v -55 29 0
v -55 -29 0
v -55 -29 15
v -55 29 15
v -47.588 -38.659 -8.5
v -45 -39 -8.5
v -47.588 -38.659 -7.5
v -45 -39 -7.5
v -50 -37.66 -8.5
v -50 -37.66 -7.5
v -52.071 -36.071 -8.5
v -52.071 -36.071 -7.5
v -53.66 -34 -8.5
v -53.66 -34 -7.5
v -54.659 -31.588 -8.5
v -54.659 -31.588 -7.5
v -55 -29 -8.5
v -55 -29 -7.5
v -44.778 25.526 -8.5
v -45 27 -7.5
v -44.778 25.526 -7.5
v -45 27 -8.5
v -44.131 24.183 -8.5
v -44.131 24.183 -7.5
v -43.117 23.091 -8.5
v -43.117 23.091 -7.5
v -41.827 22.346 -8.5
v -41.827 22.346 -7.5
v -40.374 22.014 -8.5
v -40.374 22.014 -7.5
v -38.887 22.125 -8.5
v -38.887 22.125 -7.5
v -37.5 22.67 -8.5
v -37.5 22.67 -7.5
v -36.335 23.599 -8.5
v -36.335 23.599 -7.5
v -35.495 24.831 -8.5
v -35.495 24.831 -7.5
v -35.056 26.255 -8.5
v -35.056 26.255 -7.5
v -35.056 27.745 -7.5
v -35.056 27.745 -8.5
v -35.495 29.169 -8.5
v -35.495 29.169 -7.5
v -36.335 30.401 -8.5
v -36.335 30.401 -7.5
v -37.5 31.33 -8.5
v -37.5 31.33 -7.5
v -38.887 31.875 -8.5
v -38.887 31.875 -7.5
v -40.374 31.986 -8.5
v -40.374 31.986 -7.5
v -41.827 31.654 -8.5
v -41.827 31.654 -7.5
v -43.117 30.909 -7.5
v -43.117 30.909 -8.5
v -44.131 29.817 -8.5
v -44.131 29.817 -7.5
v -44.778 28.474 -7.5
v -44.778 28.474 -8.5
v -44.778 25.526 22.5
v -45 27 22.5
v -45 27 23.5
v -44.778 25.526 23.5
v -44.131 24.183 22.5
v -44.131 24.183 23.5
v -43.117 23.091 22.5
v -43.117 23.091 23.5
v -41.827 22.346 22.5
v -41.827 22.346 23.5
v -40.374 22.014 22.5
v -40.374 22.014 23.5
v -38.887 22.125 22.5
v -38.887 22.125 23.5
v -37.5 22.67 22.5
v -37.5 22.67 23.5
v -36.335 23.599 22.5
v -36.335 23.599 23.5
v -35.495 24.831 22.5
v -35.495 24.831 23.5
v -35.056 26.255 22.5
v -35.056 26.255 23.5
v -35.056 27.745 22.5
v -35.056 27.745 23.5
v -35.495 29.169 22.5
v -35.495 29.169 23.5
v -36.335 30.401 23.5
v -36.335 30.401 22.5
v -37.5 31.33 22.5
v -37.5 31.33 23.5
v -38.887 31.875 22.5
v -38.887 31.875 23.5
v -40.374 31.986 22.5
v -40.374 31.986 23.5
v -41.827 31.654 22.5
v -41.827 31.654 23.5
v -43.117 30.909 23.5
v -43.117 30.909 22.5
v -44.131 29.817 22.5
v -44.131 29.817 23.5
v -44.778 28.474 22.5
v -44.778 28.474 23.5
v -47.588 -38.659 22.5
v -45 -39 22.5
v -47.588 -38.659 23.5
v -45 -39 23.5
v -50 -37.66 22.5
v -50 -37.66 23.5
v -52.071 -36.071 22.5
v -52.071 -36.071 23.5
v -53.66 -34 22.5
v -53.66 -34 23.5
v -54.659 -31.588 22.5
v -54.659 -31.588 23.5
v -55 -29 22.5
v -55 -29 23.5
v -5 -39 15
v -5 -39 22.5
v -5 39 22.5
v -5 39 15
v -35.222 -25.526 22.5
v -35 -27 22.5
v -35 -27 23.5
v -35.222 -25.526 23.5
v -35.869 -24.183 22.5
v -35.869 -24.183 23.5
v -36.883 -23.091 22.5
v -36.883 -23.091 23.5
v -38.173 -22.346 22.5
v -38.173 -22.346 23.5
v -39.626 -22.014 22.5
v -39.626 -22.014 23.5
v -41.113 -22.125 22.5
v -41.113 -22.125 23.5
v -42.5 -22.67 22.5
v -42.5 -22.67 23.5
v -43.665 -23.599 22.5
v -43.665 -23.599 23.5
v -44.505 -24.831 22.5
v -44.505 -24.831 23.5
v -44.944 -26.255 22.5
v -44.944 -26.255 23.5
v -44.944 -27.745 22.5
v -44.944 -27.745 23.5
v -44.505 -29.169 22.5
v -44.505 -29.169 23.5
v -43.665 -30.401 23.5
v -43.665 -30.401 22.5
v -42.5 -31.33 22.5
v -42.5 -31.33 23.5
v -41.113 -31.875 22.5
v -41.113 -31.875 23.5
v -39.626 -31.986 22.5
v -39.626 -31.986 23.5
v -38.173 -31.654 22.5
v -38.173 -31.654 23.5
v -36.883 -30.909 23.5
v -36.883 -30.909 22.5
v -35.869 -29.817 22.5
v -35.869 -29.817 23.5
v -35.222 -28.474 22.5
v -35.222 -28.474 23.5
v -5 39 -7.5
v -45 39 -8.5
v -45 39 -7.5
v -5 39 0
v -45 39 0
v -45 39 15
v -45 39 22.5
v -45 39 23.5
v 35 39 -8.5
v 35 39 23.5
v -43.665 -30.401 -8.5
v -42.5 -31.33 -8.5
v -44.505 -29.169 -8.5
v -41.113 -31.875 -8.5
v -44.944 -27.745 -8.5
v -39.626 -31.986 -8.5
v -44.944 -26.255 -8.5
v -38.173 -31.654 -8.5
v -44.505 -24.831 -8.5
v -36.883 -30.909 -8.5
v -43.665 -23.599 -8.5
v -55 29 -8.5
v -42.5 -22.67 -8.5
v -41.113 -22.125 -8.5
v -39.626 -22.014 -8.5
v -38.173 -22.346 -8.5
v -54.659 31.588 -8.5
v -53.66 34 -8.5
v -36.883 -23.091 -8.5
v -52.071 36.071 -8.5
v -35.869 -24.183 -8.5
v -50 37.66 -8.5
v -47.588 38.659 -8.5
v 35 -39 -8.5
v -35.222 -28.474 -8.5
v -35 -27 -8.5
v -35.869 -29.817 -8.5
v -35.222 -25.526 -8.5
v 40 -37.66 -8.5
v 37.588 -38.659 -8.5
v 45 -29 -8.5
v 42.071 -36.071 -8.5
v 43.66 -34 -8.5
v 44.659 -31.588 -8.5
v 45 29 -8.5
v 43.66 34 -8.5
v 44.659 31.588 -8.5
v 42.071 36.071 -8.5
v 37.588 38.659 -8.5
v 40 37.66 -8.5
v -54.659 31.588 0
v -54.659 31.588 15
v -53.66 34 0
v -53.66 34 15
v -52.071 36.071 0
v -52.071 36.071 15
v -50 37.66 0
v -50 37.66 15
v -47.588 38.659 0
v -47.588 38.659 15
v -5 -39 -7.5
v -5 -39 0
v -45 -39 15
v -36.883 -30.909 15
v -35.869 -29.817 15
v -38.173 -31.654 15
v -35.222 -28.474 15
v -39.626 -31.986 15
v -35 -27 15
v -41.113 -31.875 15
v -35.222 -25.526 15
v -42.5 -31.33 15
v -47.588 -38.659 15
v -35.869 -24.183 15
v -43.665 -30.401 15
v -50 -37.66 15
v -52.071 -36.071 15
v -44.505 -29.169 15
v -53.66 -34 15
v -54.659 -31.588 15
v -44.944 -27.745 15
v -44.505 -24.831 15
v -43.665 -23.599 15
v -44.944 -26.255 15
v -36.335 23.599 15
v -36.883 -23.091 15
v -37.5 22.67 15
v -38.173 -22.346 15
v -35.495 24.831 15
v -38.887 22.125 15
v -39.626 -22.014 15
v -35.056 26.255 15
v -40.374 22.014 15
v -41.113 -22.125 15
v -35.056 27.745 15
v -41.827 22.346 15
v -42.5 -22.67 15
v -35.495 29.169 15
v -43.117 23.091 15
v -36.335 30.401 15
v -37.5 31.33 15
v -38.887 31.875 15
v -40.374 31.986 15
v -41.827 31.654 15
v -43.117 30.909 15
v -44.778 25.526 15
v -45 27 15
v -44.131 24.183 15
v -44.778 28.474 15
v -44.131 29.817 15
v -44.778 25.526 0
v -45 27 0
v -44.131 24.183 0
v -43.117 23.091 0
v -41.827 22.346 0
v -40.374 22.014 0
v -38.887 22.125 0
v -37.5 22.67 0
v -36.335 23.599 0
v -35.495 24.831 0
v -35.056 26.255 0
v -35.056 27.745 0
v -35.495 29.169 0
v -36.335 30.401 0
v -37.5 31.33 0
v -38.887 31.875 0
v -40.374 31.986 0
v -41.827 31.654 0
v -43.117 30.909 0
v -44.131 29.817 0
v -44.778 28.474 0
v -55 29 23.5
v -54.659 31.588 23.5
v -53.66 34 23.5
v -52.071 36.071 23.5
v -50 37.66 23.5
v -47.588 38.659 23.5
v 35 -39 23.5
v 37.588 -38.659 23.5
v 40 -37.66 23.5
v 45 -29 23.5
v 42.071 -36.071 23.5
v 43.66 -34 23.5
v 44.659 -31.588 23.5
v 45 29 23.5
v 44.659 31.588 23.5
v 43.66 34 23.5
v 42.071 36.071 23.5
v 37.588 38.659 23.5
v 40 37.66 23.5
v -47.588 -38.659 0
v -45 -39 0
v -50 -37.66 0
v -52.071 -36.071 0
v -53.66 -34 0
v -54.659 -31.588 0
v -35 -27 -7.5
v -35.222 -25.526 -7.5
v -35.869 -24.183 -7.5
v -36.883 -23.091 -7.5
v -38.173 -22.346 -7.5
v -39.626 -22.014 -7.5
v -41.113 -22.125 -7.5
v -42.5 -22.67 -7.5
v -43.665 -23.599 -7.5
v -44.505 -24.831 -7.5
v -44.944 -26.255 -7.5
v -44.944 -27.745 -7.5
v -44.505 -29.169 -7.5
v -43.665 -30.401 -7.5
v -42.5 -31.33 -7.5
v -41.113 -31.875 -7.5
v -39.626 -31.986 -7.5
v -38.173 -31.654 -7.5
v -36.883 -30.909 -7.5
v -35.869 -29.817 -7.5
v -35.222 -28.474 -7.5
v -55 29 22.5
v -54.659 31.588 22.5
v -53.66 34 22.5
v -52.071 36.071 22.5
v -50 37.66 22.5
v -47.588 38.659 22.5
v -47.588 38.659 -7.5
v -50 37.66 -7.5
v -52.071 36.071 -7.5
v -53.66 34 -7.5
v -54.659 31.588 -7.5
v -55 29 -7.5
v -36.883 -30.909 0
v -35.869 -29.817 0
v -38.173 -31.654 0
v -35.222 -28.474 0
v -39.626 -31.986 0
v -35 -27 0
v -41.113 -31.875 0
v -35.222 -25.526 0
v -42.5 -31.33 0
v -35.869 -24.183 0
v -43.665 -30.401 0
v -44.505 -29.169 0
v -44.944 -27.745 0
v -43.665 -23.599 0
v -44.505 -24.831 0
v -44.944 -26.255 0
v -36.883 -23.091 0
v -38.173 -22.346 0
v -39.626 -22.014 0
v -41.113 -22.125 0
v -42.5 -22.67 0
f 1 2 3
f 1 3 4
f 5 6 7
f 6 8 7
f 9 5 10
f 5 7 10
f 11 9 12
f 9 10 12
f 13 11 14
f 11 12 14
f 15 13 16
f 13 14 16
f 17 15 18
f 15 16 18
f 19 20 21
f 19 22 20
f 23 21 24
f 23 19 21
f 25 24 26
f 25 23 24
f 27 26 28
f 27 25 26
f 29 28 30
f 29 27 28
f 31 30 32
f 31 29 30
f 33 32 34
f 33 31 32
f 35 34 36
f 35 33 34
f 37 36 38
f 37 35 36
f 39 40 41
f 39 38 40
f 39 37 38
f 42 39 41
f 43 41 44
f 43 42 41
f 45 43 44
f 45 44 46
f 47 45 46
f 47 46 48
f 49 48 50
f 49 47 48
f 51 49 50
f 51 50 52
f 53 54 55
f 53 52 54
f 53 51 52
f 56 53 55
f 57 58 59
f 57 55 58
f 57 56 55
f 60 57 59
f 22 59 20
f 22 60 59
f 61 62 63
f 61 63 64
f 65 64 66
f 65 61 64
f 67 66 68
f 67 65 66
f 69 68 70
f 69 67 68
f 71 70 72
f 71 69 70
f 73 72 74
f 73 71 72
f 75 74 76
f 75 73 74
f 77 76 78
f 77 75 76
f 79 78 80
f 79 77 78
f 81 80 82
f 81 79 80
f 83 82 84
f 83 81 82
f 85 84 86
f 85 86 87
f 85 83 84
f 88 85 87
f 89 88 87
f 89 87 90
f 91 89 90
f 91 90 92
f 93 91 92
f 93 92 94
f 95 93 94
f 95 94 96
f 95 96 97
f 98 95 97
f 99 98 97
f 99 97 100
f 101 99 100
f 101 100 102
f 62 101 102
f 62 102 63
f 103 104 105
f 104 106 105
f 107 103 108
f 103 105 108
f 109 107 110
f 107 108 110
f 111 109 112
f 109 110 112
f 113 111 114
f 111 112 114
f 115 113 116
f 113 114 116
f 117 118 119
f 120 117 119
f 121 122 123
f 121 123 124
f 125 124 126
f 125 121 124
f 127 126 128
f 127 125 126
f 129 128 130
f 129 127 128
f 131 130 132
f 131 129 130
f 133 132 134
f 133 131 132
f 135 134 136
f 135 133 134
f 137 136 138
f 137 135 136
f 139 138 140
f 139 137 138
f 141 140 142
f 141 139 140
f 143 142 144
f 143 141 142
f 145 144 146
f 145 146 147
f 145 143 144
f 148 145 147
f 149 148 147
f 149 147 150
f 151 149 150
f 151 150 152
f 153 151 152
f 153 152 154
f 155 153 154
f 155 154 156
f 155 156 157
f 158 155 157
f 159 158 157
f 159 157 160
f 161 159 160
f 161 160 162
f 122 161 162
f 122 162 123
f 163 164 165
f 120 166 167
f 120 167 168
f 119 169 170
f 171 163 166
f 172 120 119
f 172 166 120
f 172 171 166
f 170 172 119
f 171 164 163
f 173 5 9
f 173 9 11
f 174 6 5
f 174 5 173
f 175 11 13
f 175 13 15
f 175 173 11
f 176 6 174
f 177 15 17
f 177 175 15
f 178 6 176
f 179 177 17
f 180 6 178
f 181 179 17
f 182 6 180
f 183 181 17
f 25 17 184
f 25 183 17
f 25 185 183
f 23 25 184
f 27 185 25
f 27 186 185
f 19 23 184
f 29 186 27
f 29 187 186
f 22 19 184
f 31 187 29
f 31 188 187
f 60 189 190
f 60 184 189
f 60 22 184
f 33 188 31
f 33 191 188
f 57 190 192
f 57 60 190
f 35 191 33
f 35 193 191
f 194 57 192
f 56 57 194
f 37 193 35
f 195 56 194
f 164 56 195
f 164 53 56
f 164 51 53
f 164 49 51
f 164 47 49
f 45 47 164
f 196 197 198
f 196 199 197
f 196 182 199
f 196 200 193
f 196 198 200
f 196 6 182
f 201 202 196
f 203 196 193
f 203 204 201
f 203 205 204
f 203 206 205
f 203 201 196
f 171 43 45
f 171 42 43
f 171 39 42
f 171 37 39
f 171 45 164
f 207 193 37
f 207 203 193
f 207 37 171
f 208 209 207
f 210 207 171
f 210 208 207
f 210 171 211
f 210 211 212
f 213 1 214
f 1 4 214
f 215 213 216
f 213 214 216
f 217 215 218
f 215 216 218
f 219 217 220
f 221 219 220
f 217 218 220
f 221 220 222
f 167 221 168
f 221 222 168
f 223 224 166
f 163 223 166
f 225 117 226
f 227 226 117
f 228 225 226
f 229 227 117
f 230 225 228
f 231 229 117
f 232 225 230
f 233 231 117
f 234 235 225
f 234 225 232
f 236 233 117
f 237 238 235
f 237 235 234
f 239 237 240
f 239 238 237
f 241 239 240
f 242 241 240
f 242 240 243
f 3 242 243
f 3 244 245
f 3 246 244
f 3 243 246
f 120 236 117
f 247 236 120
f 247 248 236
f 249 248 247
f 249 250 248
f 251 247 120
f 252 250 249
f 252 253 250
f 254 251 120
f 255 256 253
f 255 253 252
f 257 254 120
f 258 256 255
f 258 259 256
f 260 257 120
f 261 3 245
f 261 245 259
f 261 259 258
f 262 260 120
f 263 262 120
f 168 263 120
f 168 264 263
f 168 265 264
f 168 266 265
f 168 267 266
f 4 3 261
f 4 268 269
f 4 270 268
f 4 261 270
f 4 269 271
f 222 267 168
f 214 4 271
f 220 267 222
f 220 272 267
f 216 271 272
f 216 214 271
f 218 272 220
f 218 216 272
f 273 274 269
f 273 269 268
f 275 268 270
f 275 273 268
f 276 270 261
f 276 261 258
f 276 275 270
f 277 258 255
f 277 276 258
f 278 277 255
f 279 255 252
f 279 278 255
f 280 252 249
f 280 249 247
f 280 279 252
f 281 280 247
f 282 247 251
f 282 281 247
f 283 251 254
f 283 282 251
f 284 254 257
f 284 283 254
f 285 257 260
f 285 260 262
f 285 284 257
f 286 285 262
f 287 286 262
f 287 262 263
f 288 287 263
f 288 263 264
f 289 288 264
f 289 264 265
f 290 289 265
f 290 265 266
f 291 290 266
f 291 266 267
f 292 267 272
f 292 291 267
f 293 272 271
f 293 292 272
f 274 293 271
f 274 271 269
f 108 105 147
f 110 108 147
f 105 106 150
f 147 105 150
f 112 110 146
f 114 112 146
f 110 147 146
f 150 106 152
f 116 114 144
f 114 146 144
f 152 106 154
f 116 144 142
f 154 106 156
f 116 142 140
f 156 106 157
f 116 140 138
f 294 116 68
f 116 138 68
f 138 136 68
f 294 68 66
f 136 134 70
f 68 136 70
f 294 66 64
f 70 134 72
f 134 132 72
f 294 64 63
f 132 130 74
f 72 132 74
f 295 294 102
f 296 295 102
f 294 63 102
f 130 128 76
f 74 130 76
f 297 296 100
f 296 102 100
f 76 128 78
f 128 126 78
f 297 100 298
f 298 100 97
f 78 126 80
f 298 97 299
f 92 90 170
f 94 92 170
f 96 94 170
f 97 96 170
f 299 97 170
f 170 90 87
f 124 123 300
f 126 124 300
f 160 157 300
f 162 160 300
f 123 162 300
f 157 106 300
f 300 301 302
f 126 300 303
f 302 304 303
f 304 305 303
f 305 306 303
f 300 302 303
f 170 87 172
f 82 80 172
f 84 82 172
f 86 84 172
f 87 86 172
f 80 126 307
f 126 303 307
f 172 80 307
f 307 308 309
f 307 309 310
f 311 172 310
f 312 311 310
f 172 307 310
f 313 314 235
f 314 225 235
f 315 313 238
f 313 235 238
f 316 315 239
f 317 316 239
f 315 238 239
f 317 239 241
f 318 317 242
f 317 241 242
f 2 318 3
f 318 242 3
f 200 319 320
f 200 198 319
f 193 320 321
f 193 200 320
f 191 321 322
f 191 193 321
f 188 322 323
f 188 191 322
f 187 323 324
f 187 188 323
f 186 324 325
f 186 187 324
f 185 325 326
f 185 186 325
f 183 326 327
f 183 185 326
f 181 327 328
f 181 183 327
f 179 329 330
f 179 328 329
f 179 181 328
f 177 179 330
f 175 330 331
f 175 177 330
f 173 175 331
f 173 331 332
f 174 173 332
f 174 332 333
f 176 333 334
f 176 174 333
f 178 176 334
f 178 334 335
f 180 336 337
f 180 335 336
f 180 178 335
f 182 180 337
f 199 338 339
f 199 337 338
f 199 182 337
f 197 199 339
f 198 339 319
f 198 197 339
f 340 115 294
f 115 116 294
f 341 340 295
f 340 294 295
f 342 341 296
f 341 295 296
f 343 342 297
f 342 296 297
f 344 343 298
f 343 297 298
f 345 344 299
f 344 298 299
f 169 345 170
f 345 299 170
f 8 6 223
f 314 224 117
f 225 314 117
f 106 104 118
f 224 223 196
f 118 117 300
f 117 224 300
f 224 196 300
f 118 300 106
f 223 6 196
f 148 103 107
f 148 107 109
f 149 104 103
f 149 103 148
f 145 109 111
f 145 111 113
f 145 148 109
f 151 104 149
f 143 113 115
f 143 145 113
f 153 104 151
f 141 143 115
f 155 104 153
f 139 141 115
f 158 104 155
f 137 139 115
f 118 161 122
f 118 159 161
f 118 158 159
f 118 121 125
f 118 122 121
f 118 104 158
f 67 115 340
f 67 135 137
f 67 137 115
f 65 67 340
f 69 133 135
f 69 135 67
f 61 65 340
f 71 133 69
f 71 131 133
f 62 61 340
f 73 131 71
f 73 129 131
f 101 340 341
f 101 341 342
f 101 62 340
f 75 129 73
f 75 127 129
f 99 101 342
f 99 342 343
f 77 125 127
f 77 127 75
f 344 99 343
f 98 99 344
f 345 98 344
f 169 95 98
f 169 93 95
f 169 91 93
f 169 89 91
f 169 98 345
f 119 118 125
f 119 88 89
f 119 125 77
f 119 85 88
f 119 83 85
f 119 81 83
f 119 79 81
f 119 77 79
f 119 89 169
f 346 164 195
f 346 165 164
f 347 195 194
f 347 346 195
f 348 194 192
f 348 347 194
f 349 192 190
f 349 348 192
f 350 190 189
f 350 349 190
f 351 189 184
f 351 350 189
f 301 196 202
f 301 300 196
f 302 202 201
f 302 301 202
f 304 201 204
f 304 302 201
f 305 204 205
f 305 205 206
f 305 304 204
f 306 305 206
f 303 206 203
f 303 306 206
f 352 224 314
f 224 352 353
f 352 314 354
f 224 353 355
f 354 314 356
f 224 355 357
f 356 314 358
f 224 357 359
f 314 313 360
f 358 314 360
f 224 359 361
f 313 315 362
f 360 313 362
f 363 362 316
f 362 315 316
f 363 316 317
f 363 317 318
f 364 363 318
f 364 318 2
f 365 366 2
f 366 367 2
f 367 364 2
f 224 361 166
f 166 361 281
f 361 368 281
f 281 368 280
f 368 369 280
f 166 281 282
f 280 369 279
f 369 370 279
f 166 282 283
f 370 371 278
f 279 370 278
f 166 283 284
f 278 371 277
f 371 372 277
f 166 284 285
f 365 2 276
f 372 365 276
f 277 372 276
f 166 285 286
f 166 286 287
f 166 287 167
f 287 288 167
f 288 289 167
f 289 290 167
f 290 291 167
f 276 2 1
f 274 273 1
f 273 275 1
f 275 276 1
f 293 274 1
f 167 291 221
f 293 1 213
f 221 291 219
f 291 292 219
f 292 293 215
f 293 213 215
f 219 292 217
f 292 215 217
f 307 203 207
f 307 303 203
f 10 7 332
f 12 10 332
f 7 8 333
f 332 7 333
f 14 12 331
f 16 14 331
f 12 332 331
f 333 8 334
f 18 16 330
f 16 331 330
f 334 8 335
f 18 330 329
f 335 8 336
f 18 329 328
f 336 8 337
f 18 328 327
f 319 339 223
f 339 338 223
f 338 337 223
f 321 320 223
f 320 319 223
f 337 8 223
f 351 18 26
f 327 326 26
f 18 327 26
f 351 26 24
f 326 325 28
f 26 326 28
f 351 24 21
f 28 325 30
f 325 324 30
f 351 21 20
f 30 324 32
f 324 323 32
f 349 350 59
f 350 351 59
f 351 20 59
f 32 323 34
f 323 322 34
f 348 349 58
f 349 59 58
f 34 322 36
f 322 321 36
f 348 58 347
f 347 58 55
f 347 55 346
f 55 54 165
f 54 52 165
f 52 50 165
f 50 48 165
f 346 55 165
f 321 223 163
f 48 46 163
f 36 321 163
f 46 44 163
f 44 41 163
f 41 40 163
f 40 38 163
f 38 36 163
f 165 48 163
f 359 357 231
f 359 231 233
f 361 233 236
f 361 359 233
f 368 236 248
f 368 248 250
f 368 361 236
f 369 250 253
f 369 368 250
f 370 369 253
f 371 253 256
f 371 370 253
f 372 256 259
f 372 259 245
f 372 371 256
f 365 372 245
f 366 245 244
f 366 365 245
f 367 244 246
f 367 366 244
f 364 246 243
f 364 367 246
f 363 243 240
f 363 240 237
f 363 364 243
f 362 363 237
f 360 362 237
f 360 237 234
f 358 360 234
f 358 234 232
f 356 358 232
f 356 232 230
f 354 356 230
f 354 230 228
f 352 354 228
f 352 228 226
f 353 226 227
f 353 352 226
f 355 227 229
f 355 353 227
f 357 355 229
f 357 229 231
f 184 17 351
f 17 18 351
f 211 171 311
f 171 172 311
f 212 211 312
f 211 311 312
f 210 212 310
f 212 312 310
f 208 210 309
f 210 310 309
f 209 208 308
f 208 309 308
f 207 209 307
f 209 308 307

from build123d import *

# Parameters (mm, degrees)
SKETCH1_W           = 78
SKETCH1_H           = 100
SKETCH1_R           = 5
BOSS_EXTRUDE1_DEPTH = 15
FILLET1_R           = 10
SKETCH2_W           = 78
SKETCH2_H           = 7.5
BOSS_EXTRUDE2_DEPTH = 50
SKETCH3_W           = 78
SKETCH3_H           = 1
BOSS_EXTRUDE3_DEPTH = 100
FILLET2_R           = 10
FILLET3_R           = 10
CUT_EXTRUDE1_START  = -100
SKETCH4_R           = 5
CUT_EXTRUDE1_DEPTH  = 100


with BuildPart() as part:
    # Sketch1 → Boss-Extrude1 (new body)
    with BuildSketch(Plane(origin=(0, 0, 0), x_dir=(0, 1, 0), z_dir=(0, 0, 1))):
        with Locations((0, 5)):
            Rectangle(SKETCH1_W, SKETCH1_H)
        with Locations(Location((-27, 40, 0), (0, 0, 270))):
            Circle(SKETCH1_R, mode=Mode.SUBTRACT)
        with Locations(Location((27, 40, 0), (0, 0, 90))):
            Circle(SKETCH1_R, mode=Mode.SUBTRACT)
    extrude(amount=BOSS_EXTRUDE1_DEPTH)

    # Fillet1
    fillet1_edges = [part.edges().sort_by_distance(p)[0] for p in [
        (-55, -39, 7.5),
        (-55, 39, 7.5),
    ]]
    fillet(fillet1_edges, radius=FILLET1_R)

    # Sketch2 → Boss-Extrude2 (add)
    with BuildSketch(Plane.YZ.offset(45)):
        with Locations((0, 18.75)):
            Rectangle(SKETCH2_W, SKETCH2_H)
        with Locations((0, -3.75)):
            Rectangle(SKETCH2_W, SKETCH2_H)
    extrude(amount=-BOSS_EXTRUDE2_DEPTH)

    # Sketch3 → Boss-Extrude3 (add)
    with BuildSketch(Plane.YZ.offset(45)):
        with Locations((0, 23)):
            Rectangle(SKETCH3_W, SKETCH3_H)
        with Locations((0, -8)):
            Rectangle(SKETCH3_W, SKETCH3_H)
    extrude(amount=-BOSS_EXTRUDE3_DEPTH)

    # Fillet2
    fillet2_edges = [part.edges().sort_by_distance(p)[0] for p in [
        (-55, 39, -8),
        (-55, -39, -8),
        (45, 39, 7.5),
        (45, -39, 7.5),
    ]]
    fillet(fillet2_edges, radius=FILLET2_R)

    # Fillet3
    fillet3_edges = [part.edges().sort_by_distance(p)[0] for p in [
        (-55, -39, 23),
        (-55, 39, 23),
    ]]
    fillet(fillet3_edges, radius=FILLET3_R)

    # Sketch4 → Cut-Extrude1 (cut)
    with BuildSketch(Plane.XY.offset(23.5).offset(CUT_EXTRUDE1_START)):
        with Locations(Location((-40, 27, 0), (0, 0, 180))):
            Circle(SKETCH4_R)
        with Locations((-40, -27)):
            Circle(SKETCH4_R)
    extrude(amount=CUT_EXTRUDE1_DEPTH, mode=Mode.SUBTRACT)


solid = part.part
